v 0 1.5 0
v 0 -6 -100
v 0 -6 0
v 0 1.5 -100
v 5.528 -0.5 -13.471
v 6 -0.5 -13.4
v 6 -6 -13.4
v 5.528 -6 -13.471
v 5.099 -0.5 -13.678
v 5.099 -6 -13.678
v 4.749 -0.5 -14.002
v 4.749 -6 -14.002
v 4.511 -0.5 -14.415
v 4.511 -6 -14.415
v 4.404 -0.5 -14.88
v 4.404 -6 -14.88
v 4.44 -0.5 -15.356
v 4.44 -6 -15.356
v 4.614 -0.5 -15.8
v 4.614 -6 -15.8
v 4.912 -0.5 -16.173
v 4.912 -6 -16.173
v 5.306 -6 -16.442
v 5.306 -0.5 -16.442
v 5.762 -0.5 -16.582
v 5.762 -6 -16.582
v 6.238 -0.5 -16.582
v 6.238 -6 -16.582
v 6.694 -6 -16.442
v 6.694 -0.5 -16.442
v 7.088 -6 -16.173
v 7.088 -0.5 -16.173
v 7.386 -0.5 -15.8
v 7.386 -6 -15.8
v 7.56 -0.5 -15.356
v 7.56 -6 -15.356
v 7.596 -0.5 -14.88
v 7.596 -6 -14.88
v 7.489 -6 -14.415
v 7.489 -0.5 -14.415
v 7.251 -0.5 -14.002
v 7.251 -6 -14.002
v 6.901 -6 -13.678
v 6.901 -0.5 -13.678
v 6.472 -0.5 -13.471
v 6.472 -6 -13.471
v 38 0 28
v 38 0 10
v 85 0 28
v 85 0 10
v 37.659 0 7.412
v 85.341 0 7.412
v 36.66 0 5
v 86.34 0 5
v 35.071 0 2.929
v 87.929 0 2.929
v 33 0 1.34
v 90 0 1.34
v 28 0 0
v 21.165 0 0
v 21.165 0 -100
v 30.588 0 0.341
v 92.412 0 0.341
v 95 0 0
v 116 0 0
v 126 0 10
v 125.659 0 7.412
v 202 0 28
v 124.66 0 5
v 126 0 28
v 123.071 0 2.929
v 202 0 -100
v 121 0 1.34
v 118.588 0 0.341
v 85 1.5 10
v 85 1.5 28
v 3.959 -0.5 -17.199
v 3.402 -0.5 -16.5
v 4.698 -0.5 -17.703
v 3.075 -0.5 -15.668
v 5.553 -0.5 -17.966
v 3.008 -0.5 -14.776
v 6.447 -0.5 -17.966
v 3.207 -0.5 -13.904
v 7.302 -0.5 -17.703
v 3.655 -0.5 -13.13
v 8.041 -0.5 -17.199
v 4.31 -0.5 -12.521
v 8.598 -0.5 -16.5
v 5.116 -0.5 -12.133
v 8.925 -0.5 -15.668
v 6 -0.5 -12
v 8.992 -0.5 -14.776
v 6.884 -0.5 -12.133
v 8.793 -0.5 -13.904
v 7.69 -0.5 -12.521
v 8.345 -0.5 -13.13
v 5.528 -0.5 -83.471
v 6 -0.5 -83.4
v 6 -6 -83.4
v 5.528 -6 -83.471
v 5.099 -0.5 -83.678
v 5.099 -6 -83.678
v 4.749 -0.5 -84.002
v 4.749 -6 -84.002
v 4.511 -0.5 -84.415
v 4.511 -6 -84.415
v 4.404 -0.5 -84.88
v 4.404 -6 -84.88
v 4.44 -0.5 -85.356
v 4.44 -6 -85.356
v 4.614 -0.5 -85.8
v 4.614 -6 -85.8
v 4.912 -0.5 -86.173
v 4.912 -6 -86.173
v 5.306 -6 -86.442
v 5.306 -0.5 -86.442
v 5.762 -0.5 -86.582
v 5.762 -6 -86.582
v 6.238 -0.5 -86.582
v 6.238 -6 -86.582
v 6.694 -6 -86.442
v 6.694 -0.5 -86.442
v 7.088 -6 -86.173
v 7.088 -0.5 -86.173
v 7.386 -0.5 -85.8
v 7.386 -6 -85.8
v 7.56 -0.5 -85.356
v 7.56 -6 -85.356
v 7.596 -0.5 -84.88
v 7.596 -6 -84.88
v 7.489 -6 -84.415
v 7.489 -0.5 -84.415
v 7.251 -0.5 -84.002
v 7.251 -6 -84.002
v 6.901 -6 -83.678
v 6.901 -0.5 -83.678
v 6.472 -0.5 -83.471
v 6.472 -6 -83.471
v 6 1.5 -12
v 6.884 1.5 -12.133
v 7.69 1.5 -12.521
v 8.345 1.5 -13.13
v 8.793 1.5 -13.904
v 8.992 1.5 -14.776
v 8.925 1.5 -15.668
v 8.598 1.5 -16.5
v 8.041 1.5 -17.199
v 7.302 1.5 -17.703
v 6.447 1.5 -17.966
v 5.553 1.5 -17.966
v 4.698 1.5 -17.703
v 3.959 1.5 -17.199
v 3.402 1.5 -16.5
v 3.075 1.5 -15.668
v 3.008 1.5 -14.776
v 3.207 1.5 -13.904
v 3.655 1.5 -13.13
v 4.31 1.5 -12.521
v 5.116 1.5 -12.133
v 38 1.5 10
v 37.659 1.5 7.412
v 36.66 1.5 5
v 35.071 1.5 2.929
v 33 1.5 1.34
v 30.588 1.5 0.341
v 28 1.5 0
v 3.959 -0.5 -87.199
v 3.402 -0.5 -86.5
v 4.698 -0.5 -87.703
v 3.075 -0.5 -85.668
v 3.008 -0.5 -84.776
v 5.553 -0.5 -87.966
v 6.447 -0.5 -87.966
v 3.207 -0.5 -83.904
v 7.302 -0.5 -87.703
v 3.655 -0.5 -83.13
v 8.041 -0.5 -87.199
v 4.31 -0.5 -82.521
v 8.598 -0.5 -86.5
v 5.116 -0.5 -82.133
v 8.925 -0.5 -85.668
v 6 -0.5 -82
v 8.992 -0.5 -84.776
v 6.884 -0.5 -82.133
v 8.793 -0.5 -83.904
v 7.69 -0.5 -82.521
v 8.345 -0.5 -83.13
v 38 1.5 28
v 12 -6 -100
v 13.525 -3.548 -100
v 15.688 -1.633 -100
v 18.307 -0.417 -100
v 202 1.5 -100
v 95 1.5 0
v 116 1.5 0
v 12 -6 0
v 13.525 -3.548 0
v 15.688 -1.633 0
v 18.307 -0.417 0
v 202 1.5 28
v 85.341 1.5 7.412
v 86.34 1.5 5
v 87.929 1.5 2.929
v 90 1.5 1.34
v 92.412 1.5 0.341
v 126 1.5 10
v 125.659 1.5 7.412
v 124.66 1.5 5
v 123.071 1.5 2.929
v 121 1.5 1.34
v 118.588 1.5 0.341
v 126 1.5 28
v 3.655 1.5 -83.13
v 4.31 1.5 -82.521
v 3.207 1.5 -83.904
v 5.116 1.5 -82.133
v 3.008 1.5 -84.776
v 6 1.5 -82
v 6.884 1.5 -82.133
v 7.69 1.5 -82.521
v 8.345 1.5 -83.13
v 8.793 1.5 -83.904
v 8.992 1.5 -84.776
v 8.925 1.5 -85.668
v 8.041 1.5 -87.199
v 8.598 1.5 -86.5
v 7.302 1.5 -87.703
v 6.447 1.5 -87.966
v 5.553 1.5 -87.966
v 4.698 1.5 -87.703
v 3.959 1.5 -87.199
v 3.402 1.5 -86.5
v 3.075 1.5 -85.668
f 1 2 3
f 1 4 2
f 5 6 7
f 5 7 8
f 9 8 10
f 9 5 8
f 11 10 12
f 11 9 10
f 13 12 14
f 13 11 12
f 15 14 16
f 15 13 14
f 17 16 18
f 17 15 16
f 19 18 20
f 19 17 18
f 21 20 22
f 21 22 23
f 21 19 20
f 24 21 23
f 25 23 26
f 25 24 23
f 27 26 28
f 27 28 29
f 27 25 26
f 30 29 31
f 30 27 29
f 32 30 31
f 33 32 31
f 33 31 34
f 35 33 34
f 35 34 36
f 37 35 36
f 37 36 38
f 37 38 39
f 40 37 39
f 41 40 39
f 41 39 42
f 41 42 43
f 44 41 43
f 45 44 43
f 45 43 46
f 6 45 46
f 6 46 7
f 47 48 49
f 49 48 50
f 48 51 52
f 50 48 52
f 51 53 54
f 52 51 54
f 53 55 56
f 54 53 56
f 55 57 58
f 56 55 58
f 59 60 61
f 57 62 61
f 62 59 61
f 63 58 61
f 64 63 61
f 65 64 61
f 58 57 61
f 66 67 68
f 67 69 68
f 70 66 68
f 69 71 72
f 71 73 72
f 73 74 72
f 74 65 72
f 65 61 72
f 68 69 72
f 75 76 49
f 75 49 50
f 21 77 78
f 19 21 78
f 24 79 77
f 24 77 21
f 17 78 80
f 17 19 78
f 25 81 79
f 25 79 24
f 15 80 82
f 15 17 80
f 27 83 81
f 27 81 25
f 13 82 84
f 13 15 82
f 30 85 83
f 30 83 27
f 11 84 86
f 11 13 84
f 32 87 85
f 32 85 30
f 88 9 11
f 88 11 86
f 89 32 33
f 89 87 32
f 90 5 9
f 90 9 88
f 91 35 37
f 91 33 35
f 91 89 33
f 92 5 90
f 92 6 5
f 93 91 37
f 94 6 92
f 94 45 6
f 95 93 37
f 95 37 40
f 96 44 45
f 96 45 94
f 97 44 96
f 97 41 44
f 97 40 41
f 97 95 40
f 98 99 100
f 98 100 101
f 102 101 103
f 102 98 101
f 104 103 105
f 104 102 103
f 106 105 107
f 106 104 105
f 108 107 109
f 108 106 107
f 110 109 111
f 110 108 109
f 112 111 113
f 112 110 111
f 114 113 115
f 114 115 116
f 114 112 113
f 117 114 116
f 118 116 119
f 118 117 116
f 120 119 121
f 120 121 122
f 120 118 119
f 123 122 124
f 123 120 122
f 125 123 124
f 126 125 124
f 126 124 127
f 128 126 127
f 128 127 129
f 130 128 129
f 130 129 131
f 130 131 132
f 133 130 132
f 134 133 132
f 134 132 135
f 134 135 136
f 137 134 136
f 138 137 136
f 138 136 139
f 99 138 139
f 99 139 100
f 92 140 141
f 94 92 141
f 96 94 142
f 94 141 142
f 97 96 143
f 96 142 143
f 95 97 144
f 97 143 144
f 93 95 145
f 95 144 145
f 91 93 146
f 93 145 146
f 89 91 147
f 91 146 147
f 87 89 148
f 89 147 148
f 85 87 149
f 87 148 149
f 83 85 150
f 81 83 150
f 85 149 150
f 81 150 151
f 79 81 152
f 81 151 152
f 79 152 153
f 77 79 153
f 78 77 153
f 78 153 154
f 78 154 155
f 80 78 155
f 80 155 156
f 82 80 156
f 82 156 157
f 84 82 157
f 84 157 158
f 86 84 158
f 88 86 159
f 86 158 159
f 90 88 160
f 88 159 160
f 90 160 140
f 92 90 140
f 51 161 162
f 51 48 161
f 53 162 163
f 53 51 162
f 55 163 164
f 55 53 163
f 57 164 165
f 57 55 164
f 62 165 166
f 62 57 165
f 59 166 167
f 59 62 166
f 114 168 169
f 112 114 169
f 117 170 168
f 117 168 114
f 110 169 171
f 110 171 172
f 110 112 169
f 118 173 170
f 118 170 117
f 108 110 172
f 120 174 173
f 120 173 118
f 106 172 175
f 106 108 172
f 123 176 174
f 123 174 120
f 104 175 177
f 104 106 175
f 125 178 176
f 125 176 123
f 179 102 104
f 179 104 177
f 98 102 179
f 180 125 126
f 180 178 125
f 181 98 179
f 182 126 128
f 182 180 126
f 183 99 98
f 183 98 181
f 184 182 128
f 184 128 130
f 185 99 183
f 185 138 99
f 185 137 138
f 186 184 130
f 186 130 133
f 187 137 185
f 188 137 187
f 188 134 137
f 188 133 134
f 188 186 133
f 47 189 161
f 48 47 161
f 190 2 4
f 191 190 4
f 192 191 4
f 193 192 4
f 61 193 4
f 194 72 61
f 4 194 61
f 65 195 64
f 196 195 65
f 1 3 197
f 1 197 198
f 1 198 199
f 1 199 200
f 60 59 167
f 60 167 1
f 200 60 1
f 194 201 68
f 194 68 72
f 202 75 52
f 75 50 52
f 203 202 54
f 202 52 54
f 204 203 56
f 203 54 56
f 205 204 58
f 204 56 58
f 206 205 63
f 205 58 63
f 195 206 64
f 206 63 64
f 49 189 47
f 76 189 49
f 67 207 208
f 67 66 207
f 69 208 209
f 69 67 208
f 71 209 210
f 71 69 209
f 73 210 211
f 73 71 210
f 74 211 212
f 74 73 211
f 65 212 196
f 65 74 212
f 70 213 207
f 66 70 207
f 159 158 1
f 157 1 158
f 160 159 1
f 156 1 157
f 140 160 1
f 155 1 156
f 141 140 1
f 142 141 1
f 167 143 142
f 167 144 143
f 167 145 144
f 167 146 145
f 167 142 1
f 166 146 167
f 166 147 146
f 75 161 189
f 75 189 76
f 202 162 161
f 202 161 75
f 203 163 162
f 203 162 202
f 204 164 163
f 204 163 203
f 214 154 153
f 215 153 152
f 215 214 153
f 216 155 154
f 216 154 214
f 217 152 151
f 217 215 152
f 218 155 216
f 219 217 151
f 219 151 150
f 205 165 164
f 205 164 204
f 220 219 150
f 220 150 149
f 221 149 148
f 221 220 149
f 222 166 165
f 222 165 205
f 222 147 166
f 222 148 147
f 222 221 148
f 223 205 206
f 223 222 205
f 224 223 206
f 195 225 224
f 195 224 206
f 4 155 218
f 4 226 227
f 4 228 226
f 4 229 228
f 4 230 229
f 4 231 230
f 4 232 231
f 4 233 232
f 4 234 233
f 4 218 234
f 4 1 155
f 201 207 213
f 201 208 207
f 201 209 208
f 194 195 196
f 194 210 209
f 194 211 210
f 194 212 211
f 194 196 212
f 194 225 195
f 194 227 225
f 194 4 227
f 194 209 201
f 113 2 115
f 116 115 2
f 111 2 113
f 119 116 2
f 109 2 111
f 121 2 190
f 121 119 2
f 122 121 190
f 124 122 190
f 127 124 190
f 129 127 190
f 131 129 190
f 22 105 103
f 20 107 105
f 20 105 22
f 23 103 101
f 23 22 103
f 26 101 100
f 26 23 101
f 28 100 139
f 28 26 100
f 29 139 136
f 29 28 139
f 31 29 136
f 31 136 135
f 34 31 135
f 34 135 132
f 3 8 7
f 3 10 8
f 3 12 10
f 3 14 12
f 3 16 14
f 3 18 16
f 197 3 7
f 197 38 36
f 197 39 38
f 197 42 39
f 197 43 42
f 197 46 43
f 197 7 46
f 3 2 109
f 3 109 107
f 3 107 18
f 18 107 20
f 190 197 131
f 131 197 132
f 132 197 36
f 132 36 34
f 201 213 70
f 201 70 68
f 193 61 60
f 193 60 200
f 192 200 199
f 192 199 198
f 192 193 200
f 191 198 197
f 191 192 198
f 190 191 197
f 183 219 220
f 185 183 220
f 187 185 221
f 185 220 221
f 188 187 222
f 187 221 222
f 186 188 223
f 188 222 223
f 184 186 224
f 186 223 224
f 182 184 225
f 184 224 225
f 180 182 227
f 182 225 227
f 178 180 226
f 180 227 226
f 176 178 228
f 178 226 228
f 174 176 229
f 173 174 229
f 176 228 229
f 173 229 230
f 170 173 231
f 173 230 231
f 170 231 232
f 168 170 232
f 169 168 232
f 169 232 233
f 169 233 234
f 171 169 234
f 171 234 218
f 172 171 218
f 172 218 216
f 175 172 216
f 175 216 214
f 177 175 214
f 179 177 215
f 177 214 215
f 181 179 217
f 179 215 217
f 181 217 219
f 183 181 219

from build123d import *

# Parameters (mm, degrees)
CROQUIS1_W              = 202
CROQUIS1_H              = 100
SALIENTE_EXTRUIR1_DEPTH = 1.5
CROQUIS2_R              = 1.6
CORTAR_EXTRUIR1_DEPTH   = 1.5
CROQUIS3_W              = 12
CROQUIS3_H              = 100
CROQUIS3_R              = 1.6
SALIENTE_EXTRUIR2_DEPTH = 6
CROQUIS4_W              = 47
CROQUIS4_H              = 28
CROQUIS4_W_2            = 76
SALIENTE_EXTRUIR3_DEPTH = 1.5
REDONDEO1_R             = 10
REDONDEO2_R             = 10
CROQUIS5_R              = 3
CORTAR_EXTRUIR2_DEPTH   = 2


with BuildPart() as part:
    # Croquis1 → Saliente-Extruir1 (new body)
    with BuildSketch(Plane(origin=(0, 0, 0), x_dir=(1, 0, 0), z_dir=(0, 1, 0))):
        with Locations((101, 50)):
            Rectangle(CROQUIS1_W, CROQUIS1_H)
    extrude(amount=SALIENTE_EXTRUIR1_DEPTH)

    # Croquis2 → Cortar-Extruir1 (cut)
    with BuildSketch(Plane(origin=(0, 1.5, 0), x_dir=(1, 0, 0), z_dir=(0, 1, 0))):
        with Locations(Location((6, 85, 0), (0, 0, 270))):
            Circle(CROQUIS2_R)
        with Locations(Location((6, 15, 0), (0, 0, 270))):
            Circle(CROQUIS2_R)
    extrude(amount=-CORTAR_EXTRUIR1_DEPTH, mode=Mode.SUBTRACT)

    # Croquis3 → Saliente-Extruir2 (add)
    with BuildSketch(Plane.XZ):
        with Locations((6, -50)):
            Rectangle(CROQUIS3_W, CROQUIS3_H)
        with Locations(Location((6, -15, 0), (0, 0, 90))):
            Circle(CROQUIS3_R, mode=Mode.SUBTRACT)
        with Locations(Location((6, -85, 0), (0, 0, 90))):
            Circle(CROQUIS3_R, mode=Mode.SUBTRACT)
    extrude(amount=SALIENTE_EXTRUIR2_DEPTH)

    # Croquis4 → Saliente-Extruir3 (add)
    with BuildSketch(Plane(origin=(0, 1.5, 0), x_dir=(1, 0, 0), z_dir=(0, 1, 0))):
        with Locations((61.5, -14)):
            Rectangle(CROQUIS4_W, CROQUIS4_H)
        with Locations((164, -14)):
            Rectangle(CROQUIS4_W_2, CROQUIS4_H)
    extrude(amount=-SALIENTE_EXTRUIR3_DEPTH)

    # Redondeo1
    redondeo1_edges = [part.edges().sort_by_distance(p)[0] for p in [
        (85, 0.75, 0),
        (38, 0.75, 0),
        (126, 0.75, 0),
    ]]
    fillet(redondeo1_edges, radius=REDONDEO1_R)

    # Redondeo2
    # the kernel refuses this fillet: 10 mm, written as the material it adds along each edge
    with BuildSketch(Plane(origin=(12, 0, -100), x_dir=(0, -1, 0), z_dir=(0, 0, 1))) as redondeo2_piece_1:
        with BuildLine():
            CenterArc((10, 9.16515139), REDONDEO2_R, 180, 66.421821522)
            Line((0, 9.16515139), (-0.2, 9.16515139))
            Line((-0.2, 9.16515139), (-0.2, 0))
            Line((-0.2, 0), (0, -0.2))
            ThreePointArc((0, -0.2), (3, -0.2), (5.92, -0.183303028))
            Line((5.92, -0.183303028), (6, 0))
        make_face()
    extrude(amount=100)

    # Croquis5 → Cortar-Extruir2 (cut)
    with BuildSketch(Plane(origin=(0, 1.5, 0), x_dir=(1, 0, 0), z_dir=(0, 1, 0))):
        with Locations(Location((6, 85, 0), (0, 0, 270))):
            Circle(CROQUIS5_R)
        with Locations(Location((6, 15, 0), (0, 0, 270))):
            Circle(CROQUIS5_R)
    extrude(amount=-CORTAR_EXTRUIR2_DEPTH, mode=Mode.SUBTRACT)


solid = part.part
